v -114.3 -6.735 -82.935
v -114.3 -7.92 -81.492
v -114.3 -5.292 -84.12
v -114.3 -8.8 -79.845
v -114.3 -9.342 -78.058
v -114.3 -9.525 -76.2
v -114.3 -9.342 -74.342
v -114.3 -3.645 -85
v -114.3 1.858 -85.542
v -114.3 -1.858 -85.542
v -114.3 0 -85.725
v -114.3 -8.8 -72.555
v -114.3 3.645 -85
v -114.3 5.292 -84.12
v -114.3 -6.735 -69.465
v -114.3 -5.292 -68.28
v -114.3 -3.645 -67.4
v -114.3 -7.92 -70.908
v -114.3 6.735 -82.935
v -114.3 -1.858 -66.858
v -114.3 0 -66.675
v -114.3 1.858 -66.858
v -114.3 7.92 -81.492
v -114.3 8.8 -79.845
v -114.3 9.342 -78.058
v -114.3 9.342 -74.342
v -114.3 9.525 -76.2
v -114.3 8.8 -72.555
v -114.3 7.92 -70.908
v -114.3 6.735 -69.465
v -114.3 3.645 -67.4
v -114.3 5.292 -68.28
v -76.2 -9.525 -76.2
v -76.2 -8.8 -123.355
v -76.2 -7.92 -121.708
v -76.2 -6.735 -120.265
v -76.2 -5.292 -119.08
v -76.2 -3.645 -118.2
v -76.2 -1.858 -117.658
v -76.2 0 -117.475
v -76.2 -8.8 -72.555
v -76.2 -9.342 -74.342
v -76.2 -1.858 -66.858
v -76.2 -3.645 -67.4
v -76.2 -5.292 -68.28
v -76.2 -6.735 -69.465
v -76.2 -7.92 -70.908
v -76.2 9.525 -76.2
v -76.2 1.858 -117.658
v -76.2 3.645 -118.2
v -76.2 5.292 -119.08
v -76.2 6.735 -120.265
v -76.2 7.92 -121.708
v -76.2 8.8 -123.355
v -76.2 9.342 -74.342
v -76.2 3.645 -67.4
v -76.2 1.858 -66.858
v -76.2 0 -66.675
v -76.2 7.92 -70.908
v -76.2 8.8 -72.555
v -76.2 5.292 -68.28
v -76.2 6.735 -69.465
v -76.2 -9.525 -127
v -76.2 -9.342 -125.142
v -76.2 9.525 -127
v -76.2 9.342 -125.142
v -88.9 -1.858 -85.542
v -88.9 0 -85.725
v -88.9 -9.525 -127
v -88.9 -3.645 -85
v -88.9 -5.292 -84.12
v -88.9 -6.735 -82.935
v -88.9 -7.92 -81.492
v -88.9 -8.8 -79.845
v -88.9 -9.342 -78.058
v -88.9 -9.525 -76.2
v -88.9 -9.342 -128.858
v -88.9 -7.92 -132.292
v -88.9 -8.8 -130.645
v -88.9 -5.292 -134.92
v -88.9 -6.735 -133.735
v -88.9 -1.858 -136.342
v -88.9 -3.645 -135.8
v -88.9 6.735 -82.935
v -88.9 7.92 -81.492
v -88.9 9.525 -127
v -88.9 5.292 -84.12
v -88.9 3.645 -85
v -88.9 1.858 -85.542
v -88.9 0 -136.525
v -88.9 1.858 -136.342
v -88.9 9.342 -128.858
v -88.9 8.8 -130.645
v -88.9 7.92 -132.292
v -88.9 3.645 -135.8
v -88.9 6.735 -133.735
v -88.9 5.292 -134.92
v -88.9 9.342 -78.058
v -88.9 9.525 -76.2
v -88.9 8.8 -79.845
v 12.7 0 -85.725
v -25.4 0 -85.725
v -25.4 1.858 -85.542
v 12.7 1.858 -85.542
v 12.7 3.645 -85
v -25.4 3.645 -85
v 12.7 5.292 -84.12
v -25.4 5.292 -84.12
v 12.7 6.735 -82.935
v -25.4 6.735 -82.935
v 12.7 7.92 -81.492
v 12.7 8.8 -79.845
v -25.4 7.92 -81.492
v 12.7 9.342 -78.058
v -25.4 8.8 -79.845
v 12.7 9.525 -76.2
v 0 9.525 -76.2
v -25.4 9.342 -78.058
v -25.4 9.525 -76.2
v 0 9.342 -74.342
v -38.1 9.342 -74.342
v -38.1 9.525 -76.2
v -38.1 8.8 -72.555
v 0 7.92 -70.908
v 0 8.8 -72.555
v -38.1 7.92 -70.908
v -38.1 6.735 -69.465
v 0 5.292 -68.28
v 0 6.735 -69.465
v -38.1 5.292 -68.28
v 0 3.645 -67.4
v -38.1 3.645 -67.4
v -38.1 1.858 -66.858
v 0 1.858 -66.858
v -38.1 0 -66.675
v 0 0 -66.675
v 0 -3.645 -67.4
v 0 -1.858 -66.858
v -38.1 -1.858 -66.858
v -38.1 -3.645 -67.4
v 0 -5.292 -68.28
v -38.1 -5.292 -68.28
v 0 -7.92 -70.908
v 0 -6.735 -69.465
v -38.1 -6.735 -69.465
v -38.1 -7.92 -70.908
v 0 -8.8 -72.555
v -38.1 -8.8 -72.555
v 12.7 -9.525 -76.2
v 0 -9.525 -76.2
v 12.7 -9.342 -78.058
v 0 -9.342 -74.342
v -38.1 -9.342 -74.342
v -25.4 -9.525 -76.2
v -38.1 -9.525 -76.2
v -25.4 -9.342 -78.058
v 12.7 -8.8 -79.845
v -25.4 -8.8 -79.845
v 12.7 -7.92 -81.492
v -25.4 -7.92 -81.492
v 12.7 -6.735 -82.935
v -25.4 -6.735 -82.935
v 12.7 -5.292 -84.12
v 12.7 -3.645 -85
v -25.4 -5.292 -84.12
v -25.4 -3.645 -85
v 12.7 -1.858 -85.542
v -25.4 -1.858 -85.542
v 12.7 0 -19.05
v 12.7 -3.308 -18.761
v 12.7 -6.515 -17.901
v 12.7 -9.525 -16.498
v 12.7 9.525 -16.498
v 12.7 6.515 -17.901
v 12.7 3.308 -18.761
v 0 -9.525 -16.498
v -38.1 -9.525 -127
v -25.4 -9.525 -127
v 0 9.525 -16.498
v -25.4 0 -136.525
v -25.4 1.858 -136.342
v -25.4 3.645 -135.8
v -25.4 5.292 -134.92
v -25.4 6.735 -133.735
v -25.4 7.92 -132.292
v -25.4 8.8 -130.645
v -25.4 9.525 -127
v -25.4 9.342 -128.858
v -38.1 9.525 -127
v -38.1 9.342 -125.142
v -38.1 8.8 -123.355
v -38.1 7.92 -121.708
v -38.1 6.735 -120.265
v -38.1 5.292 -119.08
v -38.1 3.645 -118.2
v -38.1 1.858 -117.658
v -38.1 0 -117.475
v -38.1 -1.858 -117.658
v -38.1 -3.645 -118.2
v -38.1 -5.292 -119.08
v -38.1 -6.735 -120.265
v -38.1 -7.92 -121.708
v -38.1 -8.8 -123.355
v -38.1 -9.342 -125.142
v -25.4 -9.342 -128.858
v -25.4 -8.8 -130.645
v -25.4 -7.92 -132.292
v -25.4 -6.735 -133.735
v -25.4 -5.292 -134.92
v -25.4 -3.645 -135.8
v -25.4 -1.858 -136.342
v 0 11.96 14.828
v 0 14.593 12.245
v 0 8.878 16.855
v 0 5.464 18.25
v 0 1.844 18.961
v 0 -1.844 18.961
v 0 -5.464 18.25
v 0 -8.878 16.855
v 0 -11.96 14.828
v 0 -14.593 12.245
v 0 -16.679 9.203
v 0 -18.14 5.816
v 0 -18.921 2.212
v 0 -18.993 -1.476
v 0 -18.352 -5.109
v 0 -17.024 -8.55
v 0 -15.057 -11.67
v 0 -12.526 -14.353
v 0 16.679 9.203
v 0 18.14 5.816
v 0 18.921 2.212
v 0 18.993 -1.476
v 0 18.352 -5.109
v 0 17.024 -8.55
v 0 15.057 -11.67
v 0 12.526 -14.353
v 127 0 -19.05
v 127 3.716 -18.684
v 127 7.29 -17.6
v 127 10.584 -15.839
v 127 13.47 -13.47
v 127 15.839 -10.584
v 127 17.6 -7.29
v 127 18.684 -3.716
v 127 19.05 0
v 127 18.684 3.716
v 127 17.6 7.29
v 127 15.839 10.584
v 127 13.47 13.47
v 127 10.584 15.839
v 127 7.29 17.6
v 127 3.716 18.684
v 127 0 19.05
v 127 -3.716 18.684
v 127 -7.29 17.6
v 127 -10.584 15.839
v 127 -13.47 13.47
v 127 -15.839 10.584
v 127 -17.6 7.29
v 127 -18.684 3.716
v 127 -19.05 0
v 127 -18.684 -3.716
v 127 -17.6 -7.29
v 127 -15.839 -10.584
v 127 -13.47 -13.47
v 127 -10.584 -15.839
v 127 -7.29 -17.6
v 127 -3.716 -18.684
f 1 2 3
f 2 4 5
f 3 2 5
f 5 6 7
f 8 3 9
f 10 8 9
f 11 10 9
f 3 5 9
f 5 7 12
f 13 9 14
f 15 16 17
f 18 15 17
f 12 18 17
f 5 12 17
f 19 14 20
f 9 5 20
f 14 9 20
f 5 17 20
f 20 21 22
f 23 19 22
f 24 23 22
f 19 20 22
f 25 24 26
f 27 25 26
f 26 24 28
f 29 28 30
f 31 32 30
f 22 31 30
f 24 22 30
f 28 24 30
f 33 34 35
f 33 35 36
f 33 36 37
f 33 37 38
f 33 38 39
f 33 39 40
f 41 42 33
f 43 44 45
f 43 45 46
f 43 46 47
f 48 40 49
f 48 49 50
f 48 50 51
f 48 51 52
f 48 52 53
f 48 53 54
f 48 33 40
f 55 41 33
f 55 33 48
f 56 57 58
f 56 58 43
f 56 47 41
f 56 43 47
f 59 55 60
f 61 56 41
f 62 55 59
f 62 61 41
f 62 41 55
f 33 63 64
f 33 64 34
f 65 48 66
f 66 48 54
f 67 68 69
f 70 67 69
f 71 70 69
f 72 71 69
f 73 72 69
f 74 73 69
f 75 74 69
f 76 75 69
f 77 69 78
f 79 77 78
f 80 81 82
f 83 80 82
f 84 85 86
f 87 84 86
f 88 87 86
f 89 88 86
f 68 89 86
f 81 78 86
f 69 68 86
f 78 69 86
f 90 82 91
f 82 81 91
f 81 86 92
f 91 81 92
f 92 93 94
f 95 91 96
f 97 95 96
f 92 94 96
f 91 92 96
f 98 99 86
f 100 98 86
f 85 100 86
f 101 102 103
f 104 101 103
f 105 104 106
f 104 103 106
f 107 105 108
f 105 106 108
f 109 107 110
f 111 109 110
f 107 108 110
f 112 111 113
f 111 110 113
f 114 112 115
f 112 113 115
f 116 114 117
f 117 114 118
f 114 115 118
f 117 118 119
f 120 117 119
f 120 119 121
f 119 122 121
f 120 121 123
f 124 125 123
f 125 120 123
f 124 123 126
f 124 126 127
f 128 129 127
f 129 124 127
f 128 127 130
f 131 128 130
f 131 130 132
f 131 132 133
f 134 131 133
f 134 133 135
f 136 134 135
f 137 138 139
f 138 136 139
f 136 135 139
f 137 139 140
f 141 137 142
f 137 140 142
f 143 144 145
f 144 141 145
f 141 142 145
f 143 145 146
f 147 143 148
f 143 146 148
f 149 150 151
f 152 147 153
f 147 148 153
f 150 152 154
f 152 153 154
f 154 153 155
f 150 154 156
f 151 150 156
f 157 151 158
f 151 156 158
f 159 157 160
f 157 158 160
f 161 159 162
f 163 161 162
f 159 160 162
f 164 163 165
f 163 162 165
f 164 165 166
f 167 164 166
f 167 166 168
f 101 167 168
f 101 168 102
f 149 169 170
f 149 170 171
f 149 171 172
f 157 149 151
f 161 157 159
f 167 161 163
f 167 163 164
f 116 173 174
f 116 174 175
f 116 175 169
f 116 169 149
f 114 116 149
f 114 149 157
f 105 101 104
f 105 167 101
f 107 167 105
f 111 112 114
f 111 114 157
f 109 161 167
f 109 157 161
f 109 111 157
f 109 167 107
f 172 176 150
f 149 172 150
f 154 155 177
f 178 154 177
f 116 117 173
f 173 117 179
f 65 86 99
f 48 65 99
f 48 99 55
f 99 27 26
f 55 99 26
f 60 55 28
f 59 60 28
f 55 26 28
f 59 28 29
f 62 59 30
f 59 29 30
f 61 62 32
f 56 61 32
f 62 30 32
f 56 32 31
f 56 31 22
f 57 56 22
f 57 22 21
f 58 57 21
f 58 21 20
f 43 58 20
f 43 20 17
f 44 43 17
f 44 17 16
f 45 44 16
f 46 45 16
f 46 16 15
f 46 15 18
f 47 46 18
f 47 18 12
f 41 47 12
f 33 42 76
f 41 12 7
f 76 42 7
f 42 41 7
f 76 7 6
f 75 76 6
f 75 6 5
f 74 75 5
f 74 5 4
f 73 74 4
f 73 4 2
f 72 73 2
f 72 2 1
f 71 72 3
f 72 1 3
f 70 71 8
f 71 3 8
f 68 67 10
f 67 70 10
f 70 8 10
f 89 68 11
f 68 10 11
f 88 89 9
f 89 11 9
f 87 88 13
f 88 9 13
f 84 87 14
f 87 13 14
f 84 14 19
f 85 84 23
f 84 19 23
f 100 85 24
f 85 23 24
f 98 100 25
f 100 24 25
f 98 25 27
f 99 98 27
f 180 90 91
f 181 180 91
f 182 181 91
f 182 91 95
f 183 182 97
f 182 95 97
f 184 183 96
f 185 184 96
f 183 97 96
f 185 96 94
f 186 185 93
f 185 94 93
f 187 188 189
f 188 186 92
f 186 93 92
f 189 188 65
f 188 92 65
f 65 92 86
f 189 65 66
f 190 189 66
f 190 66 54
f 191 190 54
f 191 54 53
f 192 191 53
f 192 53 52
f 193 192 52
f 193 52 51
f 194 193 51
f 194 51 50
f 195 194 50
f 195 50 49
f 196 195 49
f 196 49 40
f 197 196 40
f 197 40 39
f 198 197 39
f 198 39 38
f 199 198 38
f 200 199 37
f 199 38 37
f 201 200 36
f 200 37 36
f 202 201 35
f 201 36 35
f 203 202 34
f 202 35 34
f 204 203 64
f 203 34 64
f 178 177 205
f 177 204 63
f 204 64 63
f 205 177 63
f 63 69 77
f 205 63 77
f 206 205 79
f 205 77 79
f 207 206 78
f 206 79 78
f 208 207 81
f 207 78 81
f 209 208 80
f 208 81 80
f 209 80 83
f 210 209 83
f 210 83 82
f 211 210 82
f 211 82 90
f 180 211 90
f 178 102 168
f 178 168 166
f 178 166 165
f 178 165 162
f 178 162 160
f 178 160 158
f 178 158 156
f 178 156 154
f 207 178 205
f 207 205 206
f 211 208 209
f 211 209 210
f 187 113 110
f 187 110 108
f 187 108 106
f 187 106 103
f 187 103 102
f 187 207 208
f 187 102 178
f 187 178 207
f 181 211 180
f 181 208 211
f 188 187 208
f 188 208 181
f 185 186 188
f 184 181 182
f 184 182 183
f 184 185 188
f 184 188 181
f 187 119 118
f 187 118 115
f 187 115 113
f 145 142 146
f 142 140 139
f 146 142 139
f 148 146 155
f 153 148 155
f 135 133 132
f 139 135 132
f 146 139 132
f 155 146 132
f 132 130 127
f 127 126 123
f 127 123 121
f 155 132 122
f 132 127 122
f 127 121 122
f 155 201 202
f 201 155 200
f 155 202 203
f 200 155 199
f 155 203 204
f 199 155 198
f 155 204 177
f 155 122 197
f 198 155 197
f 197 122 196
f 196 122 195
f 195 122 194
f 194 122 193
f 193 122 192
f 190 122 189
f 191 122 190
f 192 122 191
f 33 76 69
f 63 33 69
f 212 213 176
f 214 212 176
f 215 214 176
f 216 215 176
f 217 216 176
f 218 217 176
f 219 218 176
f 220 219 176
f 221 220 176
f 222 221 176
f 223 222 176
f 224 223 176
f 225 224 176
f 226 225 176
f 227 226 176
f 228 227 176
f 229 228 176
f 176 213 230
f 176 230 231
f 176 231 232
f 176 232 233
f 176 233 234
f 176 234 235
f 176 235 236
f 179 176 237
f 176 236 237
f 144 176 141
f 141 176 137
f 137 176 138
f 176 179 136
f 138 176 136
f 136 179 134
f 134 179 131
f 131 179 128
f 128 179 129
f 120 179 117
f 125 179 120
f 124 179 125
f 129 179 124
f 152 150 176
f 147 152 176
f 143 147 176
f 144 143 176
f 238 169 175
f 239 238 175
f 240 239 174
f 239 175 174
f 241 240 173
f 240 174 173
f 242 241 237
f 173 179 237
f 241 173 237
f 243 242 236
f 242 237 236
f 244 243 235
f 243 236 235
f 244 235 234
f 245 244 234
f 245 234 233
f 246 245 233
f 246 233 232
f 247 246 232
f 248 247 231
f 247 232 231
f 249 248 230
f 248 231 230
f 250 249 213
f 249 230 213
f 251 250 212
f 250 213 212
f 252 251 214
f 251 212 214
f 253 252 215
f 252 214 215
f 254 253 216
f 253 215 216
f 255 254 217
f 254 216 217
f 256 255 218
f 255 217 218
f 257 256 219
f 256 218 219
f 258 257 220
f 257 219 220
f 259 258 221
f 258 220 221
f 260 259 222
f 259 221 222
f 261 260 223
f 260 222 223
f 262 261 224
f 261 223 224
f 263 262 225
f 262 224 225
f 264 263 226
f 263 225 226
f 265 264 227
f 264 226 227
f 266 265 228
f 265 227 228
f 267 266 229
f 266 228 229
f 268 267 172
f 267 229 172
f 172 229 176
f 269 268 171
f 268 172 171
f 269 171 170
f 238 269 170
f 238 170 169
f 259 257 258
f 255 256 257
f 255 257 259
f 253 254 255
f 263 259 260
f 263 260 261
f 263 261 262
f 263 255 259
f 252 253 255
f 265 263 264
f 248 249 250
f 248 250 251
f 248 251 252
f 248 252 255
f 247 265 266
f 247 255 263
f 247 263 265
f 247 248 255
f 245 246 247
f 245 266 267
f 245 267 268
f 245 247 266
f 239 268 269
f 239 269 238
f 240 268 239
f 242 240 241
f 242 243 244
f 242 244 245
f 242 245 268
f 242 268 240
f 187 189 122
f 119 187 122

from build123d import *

# Parameters (mm, degrees)
BOSS_EXTRUDE1_DEPTH      = 127
BOSS_EXTRUDE2_DEPTH      = 12.7
BOSS_EXTRUDE3_DEPTH      = 12.7
BOSS_EXTRUDE3_DEPTH_BACK = 38.1
BOSS_EXTRUDE4_START      = -38.1
BOSS_EXTRUDE4_DEPTH      = 12.7
BOSS_EXTRUDE5_START      = -88.9
BOSS_EXTRUDE5_DEPTH      = 63.5
BOSS_EXTRUDE6_START      = -88.9
BOSS_EXTRUDE6_DEPTH      = 12.7
BOSS_EXTRUDE7_START      = -114.3
SKETCH1_8_R              = 9.525
BOSS_EXTRUDE7_DEPTH      = 38.1


with BuildPart() as part:
    # Sketch1 → Boss-Extrude1 (new body)
    with BuildSketch(Plane(origin=(0, 0, 0), x_dir=(0, 0, -1), z_dir=(1, 0, 0))):
        with BuildLine():
            ThreePointArc((19.05, 0), (18.400886991, 4.930502809), (16.497783942, 9.525))
            ThreePointArc((16.497783942, 9.525), (-19.05, 0), (16.497783942, -9.525))
            ThreePointArc((16.497783942, -9.525), (18.400886991, -4.930502809), (19.05, 0))
        make_face()
    extrude(amount=BOSS_EXTRUDE1_DEPTH)

    # Sketch1<3> → Boss-Extrude2 (add)
    with BuildSketch(Plane(origin=(0, 0, 0), x_dir=(0, 0, -1), z_dir=(1, 0, 0))):
        with BuildLine():
            ThreePointArc((76.2, -9.525), (66.675, 0), (76.2, 9.525))
            Line((76.2, 9.525), (16.497783942, 9.525))
            ThreePointArc((16.497783942, 9.525), (18.400886991, 4.930502809), (19.05, 0))
            ThreePointArc((19.05, 0), (18.400886991, -4.930502809), (16.497783942, -9.525))
            Line((16.497783942, -9.525), (76.2, -9.525))
        make_face()
    extrude(amount=BOSS_EXTRUDE2_DEPTH)

    # Sketch1<4> → Boss-Extrude3 (add, two sides: drawn at the far end of the back side and taken through both)
    with BuildSketch(Plane(origin=(0, 0, 0), x_dir=(0, 0, -1), z_dir=(1, 0, 0)).offset(-BOSS_EXTRUDE3_DEPTH_BACK)):
        with BuildLine():
            ThreePointArc((85.725, 0), (82.935192091, 6.735192091), (76.2, 9.525))
            ThreePointArc((76.2, 9.525), (66.675, 0), (76.2, -9.525))
            ThreePointArc((76.2, -9.525), (82.935192091, -6.735192091), (85.725, 0))
        make_face()
    extrude(amount=BOSS_EXTRUDE3_DEPTH + BOSS_EXTRUDE3_DEPTH_BACK)

    # Sketch1<5> → Boss-Extrude4 (add)
    with BuildSketch(Plane(origin=(0, 0, 0), x_dir=(0, 0, -1), z_dir=(1, 0, 0)).offset(BOSS_EXTRUDE4_START)):
        with BuildLine():
            ThreePointArc((127, -9.525), (117.475, 0), (127, 9.525))
            Line((127, 9.525), (76.2, 9.525))
            ThreePointArc((76.2, 9.525), (82.935192091, 6.735192091), (85.725, 0))
            ThreePointArc((85.725, 0), (82.935192091, -6.735192091), (76.2, -9.525))
            Line((76.2, -9.525), (127, -9.525))
        make_face()
    extrude(amount=BOSS_EXTRUDE4_DEPTH)

    # Sketch1<6> → Boss-Extrude5 (add)
    with BuildSketch(Plane(origin=(0, 0, 0), x_dir=(0, 0, -1), z_dir=(1, 0, 0)).offset(BOSS_EXTRUDE5_START)):
        with BuildLine():
            ThreePointArc((136.525, 0), (133.735192091, 6.735192091), (127, 9.525))
            ThreePointArc((127, 9.525), (117.475, 0), (127, -9.525))
            ThreePointArc((127, -9.525), (133.735192091, -6.735192091), (136.525, 0))
        make_face()
    extrude(amount=BOSS_EXTRUDE5_DEPTH)

    # Sketch1<7> → Boss-Extrude6 (add)
    with BuildSketch(Plane(origin=(0, 0, 0), x_dir=(0, 0, -1), z_dir=(1, 0, 0)).offset(BOSS_EXTRUDE6_START)):
        with BuildLine():
            ThreePointArc((127, -9.525), (117.475, 0), (127, 9.525))
            Line((127, 9.525), (76.2, 9.525))
            ThreePointArc((76.2, 9.525), (82.935192091, 6.735192091), (85.725, 0))
            ThreePointArc((85.725, 0), (82.935192091, -6.735192091), (76.2, -9.525))
            Line((76.2, -9.525), (127, -9.525))
        make_face()
    extrude(amount=BOSS_EXTRUDE6_DEPTH)

    # Sketch1<8> → Boss-Extrude7 (add)
    with BuildSketch(Plane(origin=(0, 0, 0), x_dir=(0, 0, -1), z_dir=(1, 0, 0)).offset(BOSS_EXTRUDE7_START)):
        with Locations((76.2, 0)):
            Circle(SKETCH1_8_R)
    extrude(amount=BOSS_EXTRUDE7_DEPTH)


solid = part.part
